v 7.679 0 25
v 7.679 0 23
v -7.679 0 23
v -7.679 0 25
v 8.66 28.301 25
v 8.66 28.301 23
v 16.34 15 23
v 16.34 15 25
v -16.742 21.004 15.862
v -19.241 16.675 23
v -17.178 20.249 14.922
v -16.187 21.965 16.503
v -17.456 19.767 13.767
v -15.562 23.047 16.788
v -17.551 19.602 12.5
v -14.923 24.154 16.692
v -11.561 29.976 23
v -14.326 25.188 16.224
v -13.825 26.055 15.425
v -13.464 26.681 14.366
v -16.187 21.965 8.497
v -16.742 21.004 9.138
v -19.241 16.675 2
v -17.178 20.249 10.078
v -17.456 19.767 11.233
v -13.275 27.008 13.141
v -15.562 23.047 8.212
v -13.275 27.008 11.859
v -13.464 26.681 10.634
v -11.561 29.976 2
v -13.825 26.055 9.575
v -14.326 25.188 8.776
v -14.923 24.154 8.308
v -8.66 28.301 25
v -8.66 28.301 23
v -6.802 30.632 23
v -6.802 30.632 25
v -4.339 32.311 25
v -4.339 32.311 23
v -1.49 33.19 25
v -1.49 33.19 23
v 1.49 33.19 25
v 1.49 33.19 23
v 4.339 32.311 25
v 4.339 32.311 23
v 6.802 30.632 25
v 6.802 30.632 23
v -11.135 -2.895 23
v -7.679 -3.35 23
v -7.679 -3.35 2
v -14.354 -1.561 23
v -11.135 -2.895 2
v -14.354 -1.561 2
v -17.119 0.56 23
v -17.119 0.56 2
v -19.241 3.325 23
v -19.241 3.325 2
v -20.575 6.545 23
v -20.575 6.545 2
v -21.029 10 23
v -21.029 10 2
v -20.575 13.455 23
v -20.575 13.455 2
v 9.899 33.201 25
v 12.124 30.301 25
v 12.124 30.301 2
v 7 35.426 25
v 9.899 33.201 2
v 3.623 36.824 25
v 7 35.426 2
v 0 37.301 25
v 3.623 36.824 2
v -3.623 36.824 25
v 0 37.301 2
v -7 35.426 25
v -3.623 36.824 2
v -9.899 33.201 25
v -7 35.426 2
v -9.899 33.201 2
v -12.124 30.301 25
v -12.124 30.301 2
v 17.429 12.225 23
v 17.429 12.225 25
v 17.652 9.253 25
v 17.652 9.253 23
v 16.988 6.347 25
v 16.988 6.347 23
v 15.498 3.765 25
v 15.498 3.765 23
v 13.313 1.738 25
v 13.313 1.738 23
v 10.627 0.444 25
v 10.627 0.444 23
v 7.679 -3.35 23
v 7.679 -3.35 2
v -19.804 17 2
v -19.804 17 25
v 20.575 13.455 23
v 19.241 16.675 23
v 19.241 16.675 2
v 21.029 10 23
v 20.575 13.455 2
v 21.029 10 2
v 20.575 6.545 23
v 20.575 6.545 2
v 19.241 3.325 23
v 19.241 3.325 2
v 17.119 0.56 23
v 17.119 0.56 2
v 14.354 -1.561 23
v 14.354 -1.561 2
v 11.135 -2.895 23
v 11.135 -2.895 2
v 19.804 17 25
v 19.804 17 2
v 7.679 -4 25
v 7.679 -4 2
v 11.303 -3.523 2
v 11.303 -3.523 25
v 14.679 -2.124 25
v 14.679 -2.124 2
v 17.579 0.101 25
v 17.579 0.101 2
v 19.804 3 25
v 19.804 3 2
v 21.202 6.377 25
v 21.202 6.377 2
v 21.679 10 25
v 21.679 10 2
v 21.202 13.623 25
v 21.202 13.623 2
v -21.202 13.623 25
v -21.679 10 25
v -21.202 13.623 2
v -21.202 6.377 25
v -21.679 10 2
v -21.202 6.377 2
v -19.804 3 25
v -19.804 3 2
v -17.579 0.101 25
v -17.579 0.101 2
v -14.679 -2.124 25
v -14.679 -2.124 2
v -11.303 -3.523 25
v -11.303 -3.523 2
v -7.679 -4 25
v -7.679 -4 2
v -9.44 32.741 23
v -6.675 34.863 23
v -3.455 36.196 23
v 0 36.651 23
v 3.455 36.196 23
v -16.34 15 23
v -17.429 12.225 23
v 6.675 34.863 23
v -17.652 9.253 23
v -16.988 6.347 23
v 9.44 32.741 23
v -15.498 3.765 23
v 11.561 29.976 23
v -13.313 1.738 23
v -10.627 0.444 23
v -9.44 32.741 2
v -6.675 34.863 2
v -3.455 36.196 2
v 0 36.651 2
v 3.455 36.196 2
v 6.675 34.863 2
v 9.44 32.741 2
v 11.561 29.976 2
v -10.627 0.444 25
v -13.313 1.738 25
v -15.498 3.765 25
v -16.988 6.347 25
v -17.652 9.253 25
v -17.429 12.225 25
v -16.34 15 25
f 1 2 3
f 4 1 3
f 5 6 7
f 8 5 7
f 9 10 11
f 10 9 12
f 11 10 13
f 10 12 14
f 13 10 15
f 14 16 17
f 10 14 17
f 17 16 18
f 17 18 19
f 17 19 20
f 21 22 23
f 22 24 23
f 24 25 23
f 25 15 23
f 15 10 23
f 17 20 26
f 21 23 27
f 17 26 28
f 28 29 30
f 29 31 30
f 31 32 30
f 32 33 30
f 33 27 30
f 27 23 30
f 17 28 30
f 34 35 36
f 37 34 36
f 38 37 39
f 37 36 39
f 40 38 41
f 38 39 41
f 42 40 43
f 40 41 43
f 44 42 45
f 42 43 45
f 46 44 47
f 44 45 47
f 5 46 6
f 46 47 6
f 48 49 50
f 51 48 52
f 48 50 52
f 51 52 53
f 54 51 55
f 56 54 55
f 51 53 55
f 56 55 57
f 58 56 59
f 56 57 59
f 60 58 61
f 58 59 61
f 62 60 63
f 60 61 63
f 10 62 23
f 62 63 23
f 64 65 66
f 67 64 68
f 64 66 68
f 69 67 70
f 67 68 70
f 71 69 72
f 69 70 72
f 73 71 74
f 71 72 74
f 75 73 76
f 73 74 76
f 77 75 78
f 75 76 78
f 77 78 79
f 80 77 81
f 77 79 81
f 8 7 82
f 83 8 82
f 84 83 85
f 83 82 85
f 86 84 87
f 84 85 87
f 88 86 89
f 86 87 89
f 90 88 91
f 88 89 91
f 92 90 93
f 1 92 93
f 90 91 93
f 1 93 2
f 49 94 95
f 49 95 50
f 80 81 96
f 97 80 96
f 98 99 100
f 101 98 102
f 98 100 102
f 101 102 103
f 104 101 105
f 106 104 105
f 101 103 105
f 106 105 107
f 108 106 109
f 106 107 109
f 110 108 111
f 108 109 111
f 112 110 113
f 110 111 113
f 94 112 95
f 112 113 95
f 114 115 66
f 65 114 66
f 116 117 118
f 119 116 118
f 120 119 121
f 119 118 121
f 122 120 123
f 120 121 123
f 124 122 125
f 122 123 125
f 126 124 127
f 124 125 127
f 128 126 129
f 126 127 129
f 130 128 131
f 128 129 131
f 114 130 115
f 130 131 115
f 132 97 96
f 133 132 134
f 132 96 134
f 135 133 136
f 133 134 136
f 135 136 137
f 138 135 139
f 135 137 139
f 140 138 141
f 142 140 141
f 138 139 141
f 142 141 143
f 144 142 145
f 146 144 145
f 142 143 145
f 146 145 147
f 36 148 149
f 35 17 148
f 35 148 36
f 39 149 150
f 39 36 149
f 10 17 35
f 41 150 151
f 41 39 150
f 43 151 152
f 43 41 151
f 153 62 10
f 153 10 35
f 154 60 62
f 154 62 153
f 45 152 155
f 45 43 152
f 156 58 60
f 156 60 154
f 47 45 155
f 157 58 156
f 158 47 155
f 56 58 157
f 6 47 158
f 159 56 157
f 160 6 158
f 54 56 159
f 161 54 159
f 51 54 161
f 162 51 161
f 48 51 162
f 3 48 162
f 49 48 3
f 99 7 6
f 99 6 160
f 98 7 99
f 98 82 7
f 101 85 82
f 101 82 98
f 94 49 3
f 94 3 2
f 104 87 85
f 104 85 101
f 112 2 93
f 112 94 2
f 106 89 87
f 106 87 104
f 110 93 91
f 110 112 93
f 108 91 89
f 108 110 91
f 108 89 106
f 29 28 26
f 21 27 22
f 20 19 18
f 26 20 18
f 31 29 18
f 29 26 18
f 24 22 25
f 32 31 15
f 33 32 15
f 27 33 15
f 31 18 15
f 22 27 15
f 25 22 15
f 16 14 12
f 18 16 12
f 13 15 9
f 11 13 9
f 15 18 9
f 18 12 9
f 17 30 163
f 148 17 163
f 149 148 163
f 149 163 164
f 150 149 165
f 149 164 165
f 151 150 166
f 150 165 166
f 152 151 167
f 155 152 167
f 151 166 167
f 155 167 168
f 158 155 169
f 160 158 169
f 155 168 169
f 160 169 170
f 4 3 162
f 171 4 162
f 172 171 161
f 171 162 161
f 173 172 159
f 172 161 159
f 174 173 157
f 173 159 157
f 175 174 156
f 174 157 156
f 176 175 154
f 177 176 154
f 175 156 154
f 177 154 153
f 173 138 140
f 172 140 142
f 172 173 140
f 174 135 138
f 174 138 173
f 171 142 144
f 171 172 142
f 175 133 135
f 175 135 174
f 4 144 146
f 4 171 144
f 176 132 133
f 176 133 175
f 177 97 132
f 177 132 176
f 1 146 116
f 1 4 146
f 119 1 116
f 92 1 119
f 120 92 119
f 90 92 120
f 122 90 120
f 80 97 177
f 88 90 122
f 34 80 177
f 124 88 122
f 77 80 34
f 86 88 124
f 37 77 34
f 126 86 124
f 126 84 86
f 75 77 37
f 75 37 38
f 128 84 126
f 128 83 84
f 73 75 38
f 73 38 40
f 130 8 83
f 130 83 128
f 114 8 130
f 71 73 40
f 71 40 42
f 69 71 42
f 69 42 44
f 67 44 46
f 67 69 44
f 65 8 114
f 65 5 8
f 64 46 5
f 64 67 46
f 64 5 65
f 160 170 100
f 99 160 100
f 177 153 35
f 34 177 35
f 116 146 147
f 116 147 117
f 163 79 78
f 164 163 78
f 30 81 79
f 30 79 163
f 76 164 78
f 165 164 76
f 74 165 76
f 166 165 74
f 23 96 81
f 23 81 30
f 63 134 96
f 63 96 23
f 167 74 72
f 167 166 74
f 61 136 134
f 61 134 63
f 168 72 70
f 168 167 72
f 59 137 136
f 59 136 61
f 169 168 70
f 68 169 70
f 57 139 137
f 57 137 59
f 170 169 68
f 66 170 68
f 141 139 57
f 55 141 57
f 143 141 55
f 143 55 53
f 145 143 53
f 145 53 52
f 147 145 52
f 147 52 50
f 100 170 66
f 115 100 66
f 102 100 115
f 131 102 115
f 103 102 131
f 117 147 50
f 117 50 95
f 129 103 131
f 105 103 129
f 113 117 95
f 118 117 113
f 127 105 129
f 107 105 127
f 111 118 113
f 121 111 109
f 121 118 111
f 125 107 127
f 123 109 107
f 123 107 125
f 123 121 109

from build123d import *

# Parameters (mm, degrees)
F1_DEPTH = 25
F3_START = -0.65
F2_R     = 4.3
F3_DEPTH = 2.15
F6_DEPTH = 23
F7_R     = 33.55183595
F8_DEPTH = 2


with BuildPart() as f1:
    # F0 (on Top) → F1 (new body)
    with BuildSketch(Plane.XY):
        with BuildLine():
            ThreePointArc((7.6794919243, -4), (19.8038475773, 3), (19.8038475773, 17))
            Line((19.8038475773, 17), (12.124355653, 30.3012701892))
            ThreePointArc((12.124355653, 30.3012701892), (0, 37.3012701892), (-12.124355653, 30.3012701892))
            Line((-12.124355653, 30.3012701892), (-19.8038475773, 17))
            ThreePointArc((-19.8038475773, 17), (-19.8038475773, 3), (-7.6794919243, -4))
            Line((-7.6794919243, -4), (0, -4))
            Line((0, -4), (7.6794919243, -4))
        make_face()
        with BuildLine():
            Line((7.6794919243, 0), (0, 0))
            Line((0, 0), (-7.6794919243, 0))
            ThreePointArc((-7.6794919243, 0), (-16.3397459622, 5), (-16.3397459622, 15))
            Line((-16.3397459622, 15), (-8.6602540378, 28.3012701892))
            ThreePointArc((-8.6602540378, 28.3012701892), (0, 33.3012701892), (8.6602540378, 28.3012701892))
            Line((8.6602540378, 28.3012701892), (16.3397459622, 15))
            ThreePointArc((16.3397459622, 15), (16.3397459622, 5), (7.6794919243, 0))
        make_face(mode=Mode.SUBTRACT)
    extrude(amount=F1_DEPTH)

    # F2 (on face) → F3 (cut)
    with BuildSketch(Plane(origin=(-22.2141016151, 12.8253175473, 0), x_dir=(-0.5, -0.8660254038, 0), z_dir=(-0.8660254038, 0.5, 0)).offset(F3_START)):
        with Locations((-12.5, 12.5)):
            Circle(F2_R)
    extrude(amount=-F3_DEPTH, mode=Mode.SUBTRACT)

    # F5 (on face) → F6 (cut)
    with BuildSketch(Plane(origin=(0, 0, 0), x_dir=(1, 0, 0), z_dir=(0, 0, -1))):
        with BuildLine():
            Line((-19.2409310648, -16.675), (-11.5614391405, -29.9762701892))
            ThreePointArc((-11.5614391405, -29.9762701892), (0, -36.6512701892), (11.5614391405, -29.9762701892))
            Line((11.5614391405, -29.9762701892), (19.2409310648, -16.675))
            ThreePointArc((19.2409310648, -16.675), (19.2409310648, -3.325), (7.6794919243, 3.35))
            Line((7.6794919243, 3.35), (-7.6794919243, 3.35))
            ThreePointArc((-7.6794919243, 3.35), (-19.2409310648, -3.325), (-19.2409310648, -16.675))
        make_face()
    extrude(amount=-F6_DEPTH, mode=Mode.SUBTRACT)

    # F7 (on face) → F8 (cut)
    with BuildSketch(Plane(origin=(0, 0, 0), x_dir=(1, 0, 0), z_dir=(0, 0, -1))):
        with Locations((-1.2054177932, -16.7930107564)):
            Circle(F7_R)
    extrude(amount=-F8_DEPTH, mode=Mode.SUBTRACT)


solid = f1.part
